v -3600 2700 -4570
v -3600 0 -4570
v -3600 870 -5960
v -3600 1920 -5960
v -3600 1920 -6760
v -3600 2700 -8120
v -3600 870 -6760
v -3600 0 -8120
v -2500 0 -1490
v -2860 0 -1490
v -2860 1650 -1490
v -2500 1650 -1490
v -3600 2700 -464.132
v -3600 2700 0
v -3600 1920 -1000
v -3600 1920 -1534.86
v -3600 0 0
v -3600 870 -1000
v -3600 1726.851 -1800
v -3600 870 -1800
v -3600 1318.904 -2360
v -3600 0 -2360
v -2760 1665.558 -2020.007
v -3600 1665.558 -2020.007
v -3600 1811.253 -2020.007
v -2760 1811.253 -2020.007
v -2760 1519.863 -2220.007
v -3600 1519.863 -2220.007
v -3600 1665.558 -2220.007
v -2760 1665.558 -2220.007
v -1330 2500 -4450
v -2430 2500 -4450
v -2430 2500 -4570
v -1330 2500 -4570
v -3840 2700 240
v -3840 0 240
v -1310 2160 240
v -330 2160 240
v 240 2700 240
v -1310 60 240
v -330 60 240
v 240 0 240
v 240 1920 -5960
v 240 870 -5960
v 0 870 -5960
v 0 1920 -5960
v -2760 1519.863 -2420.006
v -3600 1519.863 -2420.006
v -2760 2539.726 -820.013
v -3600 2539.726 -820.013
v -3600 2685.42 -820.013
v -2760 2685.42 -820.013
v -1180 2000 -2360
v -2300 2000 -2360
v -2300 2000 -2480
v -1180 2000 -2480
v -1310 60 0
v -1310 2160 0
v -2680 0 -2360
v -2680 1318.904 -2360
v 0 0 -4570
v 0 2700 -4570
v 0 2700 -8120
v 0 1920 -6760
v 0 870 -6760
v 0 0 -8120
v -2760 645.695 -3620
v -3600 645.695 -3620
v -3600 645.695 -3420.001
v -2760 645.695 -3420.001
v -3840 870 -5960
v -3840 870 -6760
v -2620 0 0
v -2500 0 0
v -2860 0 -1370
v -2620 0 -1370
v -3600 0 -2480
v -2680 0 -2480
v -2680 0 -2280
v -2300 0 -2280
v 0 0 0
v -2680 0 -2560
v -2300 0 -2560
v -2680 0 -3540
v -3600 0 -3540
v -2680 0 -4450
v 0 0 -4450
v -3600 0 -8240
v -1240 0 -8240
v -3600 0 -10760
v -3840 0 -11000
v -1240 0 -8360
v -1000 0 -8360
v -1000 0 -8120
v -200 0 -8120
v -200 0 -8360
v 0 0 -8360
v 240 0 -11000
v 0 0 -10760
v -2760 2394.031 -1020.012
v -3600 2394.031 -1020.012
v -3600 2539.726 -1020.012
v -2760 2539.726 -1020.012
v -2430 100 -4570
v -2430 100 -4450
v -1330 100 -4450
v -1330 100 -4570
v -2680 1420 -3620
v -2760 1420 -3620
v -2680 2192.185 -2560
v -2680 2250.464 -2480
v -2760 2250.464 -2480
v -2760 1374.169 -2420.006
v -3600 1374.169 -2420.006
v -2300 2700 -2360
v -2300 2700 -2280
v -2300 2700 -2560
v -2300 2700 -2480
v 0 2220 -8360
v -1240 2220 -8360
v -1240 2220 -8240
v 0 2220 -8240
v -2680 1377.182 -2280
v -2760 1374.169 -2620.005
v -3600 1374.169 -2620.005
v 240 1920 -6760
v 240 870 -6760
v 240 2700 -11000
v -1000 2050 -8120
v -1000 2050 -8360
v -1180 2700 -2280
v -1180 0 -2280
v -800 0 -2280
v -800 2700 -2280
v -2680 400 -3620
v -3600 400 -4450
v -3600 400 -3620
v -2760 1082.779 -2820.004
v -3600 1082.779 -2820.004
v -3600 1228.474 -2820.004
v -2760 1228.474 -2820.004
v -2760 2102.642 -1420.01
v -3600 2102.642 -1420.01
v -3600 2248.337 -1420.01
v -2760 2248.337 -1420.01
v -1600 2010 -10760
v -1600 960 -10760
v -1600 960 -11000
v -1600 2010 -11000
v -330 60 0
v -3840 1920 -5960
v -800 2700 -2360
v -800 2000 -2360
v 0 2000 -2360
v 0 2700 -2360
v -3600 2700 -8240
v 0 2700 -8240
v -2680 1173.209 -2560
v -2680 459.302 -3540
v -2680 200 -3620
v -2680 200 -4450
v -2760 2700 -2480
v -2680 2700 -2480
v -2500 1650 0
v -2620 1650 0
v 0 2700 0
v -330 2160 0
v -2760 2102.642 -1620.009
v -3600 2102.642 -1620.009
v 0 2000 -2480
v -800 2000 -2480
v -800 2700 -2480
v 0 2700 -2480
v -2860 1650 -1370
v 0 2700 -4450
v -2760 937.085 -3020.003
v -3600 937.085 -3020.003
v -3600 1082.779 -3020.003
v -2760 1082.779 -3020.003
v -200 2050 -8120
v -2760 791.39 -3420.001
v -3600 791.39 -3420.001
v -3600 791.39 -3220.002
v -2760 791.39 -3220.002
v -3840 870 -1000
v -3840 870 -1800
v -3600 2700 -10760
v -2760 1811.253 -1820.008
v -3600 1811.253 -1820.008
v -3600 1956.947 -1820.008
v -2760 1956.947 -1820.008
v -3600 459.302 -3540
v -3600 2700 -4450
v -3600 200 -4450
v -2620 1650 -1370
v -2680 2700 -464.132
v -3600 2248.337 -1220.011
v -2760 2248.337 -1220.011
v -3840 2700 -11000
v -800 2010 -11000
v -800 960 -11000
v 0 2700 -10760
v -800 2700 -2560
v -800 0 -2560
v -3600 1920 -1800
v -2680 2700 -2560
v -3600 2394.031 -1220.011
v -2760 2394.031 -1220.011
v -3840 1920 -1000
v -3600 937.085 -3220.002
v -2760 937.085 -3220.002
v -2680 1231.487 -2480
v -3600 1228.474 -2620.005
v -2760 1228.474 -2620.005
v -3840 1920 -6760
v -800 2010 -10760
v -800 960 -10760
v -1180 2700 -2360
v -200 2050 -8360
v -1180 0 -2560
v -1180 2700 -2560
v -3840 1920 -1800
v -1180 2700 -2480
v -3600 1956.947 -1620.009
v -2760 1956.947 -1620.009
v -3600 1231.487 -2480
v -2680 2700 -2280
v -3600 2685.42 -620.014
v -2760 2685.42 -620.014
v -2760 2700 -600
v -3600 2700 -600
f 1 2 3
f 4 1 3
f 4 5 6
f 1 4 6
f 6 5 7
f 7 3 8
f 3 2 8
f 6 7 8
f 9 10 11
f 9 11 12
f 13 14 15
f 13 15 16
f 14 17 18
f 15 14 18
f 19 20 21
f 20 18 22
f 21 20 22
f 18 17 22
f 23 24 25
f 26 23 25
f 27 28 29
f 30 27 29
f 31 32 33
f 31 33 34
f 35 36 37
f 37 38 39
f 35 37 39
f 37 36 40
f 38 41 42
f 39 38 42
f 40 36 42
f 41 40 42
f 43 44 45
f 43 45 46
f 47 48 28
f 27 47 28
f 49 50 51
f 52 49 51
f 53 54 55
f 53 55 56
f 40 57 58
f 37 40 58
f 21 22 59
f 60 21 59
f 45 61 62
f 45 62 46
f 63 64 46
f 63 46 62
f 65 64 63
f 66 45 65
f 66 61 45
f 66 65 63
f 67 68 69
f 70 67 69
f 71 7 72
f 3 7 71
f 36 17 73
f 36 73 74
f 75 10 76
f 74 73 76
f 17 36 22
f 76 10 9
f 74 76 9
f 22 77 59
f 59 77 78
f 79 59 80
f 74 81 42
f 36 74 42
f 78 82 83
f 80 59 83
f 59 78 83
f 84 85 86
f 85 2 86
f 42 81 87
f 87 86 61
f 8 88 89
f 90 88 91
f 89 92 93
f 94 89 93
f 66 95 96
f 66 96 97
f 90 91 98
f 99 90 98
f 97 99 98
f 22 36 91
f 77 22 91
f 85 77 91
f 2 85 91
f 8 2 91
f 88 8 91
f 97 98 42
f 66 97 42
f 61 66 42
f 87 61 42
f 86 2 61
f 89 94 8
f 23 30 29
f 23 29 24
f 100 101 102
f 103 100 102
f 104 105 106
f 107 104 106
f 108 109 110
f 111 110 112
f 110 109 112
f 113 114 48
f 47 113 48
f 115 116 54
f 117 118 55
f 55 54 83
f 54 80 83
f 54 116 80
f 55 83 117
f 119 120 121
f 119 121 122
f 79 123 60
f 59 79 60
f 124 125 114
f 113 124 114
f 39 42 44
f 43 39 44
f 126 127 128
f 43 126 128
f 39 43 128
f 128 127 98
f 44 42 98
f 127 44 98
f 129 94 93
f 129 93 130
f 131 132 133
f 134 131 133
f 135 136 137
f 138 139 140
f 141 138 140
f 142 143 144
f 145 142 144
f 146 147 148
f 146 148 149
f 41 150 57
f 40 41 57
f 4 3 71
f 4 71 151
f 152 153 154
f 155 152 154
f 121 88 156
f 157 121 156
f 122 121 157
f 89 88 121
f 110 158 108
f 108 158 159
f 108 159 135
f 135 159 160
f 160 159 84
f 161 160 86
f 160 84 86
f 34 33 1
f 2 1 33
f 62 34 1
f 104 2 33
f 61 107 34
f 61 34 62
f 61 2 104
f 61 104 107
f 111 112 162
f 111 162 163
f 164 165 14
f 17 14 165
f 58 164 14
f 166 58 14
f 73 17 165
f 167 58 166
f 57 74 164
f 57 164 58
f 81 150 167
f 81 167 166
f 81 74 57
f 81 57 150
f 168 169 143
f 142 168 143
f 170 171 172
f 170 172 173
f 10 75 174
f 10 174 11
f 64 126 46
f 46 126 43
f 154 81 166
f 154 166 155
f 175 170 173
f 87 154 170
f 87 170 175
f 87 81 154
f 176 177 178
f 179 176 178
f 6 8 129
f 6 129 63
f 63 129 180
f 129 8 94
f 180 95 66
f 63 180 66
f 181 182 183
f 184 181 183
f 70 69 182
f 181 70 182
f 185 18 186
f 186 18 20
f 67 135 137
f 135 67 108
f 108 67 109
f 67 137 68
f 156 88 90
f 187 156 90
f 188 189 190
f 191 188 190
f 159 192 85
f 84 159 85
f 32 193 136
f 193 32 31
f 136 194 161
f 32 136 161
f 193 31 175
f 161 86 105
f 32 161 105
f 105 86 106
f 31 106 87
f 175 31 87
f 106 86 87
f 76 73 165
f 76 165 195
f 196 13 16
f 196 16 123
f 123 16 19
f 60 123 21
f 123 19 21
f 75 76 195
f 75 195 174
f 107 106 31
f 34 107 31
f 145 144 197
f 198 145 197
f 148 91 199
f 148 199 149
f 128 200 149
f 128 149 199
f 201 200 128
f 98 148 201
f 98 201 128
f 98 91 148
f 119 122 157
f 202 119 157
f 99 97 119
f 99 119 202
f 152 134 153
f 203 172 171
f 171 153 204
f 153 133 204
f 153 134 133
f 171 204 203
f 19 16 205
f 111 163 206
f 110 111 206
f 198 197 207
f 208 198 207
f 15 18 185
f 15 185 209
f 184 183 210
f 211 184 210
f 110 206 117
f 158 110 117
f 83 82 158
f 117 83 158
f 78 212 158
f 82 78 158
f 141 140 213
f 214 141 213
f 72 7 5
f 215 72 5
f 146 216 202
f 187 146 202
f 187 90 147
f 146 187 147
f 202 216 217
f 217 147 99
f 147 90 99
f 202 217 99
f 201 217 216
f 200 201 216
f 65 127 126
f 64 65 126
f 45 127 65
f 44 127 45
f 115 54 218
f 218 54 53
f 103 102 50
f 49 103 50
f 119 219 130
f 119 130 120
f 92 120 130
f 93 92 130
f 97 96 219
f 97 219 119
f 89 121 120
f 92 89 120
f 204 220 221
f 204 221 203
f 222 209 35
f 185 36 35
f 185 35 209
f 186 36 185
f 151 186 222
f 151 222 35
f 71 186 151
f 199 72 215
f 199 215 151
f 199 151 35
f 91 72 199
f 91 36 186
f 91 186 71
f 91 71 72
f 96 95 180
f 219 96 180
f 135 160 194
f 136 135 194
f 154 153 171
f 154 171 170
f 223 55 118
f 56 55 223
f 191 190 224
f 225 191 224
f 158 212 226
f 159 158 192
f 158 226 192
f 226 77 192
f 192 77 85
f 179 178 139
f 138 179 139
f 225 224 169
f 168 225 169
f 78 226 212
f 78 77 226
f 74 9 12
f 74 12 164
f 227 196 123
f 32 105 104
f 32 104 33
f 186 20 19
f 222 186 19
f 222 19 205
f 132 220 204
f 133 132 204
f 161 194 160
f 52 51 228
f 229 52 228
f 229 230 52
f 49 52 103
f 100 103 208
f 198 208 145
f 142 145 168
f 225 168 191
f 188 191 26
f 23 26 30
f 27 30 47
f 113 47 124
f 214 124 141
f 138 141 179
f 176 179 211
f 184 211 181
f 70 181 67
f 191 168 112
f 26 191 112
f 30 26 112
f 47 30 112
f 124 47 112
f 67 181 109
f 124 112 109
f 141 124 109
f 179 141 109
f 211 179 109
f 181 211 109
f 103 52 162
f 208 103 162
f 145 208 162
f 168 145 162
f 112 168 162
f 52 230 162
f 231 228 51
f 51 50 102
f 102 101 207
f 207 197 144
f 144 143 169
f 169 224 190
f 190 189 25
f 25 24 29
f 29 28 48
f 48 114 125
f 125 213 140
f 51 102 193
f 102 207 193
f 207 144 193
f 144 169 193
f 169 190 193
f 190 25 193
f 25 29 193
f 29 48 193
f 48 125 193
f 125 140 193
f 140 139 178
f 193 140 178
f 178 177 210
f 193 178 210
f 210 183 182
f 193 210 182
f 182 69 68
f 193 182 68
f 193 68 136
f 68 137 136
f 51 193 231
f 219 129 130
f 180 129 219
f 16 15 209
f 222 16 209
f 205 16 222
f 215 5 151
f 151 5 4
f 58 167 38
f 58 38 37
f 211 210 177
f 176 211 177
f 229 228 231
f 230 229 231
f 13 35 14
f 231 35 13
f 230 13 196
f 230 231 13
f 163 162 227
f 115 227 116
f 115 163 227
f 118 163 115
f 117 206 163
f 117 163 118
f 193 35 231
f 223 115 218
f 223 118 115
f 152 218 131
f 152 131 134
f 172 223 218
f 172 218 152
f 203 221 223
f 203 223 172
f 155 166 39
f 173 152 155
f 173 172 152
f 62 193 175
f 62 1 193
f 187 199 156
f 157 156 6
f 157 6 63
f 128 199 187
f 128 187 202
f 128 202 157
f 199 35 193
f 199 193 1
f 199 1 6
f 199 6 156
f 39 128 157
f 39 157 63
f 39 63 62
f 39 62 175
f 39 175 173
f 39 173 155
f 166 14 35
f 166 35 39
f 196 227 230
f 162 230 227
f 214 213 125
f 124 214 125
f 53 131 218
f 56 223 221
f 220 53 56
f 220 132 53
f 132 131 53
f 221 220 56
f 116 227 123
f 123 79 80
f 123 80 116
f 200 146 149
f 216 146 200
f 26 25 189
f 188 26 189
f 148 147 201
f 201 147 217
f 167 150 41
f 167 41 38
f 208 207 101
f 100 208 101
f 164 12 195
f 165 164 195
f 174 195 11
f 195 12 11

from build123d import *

# Parameters (mm, degrees)
SKETCH_1_W                = 4080
SKETCH_1_H                = 11240
SKETCH_1_W_2              = 3600
SKETCH_1_H_2              = 10760
EXTRUDE_512_DEPTH         = 2700
SKETCH_6_W                = 3600
SKETCH_6_H                = 120
EXTRUDE_823_DEPTH         = 2700
SKETCH_12_W               = 1240
SKETCH_12_H               = 120
EXTRUDE_1044_DEPTH        = 2220
CUT_EXTRUDE_1283_REACH    = 2882
SKETCH_10_W               = 800
SKETCH_10_H               = 2050
SKETCH_7_W                = 3600
SKETCH_7_H                = 120
EXTRUDE_1405_DEPTH        = 2700
CUT_EXTRUDE_1668_REACH    = 6552
SKETCH_13_W               = 1100
SKETCH_13_H               = 2400
SKETCH_8_W                = 3600
SKETCH_8_H                = 120
EXTRUDE_1790_DEPTH        = 2700
EXTRUDE_2112_DEPTH        = 840
EXTRUDE_2407_DEPTH        = 80
CUT_EXTRUDE_2805_REACH    = 2702
SKETCH_19_W               = 840
SKETCH_19_H               = 120
EXTRUDE_2943_DEPTH        = 1650
EXTRUDE_3217_DEPTH        = 840
PATTERN_LINEAR_3276_COUNT = 15
PATTERN_LINEAR_3276_PITCH = 247.44
SKETCH_22_W               = 920
SKETCH_22_H               = 830
EXTRUDE_7_DEPTH           = 200
EXTRUDE_8_DEPTH           = 200
SKETCH_14_W               = 380
SKETCH_14_H               = 280
EXTRUDE_3881_DEPTH        = 2700
CUT_EXTRUDE_4195_REACH    = 8642
SKETCH_15_W               = 800
SKETCH_15_H               = 2000
SKETCH_15_W_2             = 1120
SKETCH_2_W                = 980
SKETCH_2_H                = 2100
CUT_EXTRUDE_4473_DEPTH    = 241
SKETCH_4_W                = 800
SKETCH_4_H                = 1050
CUT_EXTRUDE_4728_DEPTH    = 241
SKETCH_3_W                = 800
SKETCH_3_H                = 1050
CUT_EXTRUDE_5092_DEPTH    = 4080
CUT_EXTRUDE_5326_REACH    = 242
SKETCH_16_W               = 800
SKETCH_16_H               = 1050


with BuildPart() as part:
    # 草图1 → Extrude 512 (new body)
    with BuildSketch(Plane(origin=(0, 0, 0), x_dir=(1, 0, 0), z_dir=(0, 1, 0))):
        with Locations((-1800, 5380)):
            Rectangle(SKETCH_1_W, SKETCH_1_H)
        with Locations((-1800, 5380)):
            Rectangle(SKETCH_1_W_2, SKETCH_1_H_2, mode=Mode.SUBTRACT)
    extrude(amount=EXTRUDE_512_DEPTH)

    # 草图6 → Extrude 823 (add)
    with BuildSketch(Plane(origin=(0, 0, 0), x_dir=(1, 0, 0), z_dir=(0, 1, 0))):
        with Locations((-1800, 8180)):
            Rectangle(SKETCH_6_W, SKETCH_6_H)
    extrude(amount=EXTRUDE_823_DEPTH)

    # 草图12 → Extrude 1044 (add)
    with BuildSketch(Plane(origin=(0, 0, 0), x_dir=(1, 0, 0), z_dir=(0, 1, 0))):
        with Locations((-620, 8300)):
            Rectangle(SKETCH_12_W, SKETCH_12_H)
    extrude(amount=EXTRUDE_1044_DEPTH)

    # 草图10 → Cut-Extrude 1283 (cut, up to next)
    with BuildSketch(Plane.XY.offset(-8120), mode=Mode.PRIVATE) as cut_extrude_1283_sk1:
        with Locations((-600, 1025)):
            Rectangle(SKETCH_10_W, SKETCH_10_H)
    cut_extrude_1283_tool1 = extrude(cut_extrude_1283_sk1.sketch, amount=-CUT_EXTRUDE_1283_REACH, mode=Mode.PRIVATE) & part.part
    add(cut_extrude_1283_tool1.solids().sort_by_distance((-600, 1025, -8120))[0], mode=Mode.SUBTRACT)

    # 草图7 → Extrude 1405 (add)
    with BuildSketch(Plane(origin=(0, 0, 0), x_dir=(1, 0, 0), z_dir=(0, 1, 0))):
        with Locations((-1800, 4510)):
            Rectangle(SKETCH_7_W, SKETCH_7_H)
    extrude(amount=EXTRUDE_1405_DEPTH)

    # 草图13 → Cut-Extrude 1668 (cut, up to next)
    with BuildSketch(Plane.XY.offset(-4450), mode=Mode.PRIVATE) as cut_extrude_1668_sk1:
        with Locations((-1880, 1300)):
            Rectangle(SKETCH_13_W, SKETCH_13_H)
    cut_extrude_1668_tool1 = extrude(cut_extrude_1668_sk1.sketch, amount=-CUT_EXTRUDE_1668_REACH, mode=Mode.PRIVATE) & part.part
    add(cut_extrude_1668_tool1.solids().sort_by_distance((-1880, 1300, -4450))[0], mode=Mode.SUBTRACT)

    # 草图8 → Extrude 1790 (add)
    with BuildSketch(Plane(origin=(0, 0, 0), x_dir=(1, 0, 0), z_dir=(0, 1, 0))):
        with Locations((-1800, 2420)):
            Rectangle(SKETCH_8_W, SKETCH_8_H)
    extrude(amount=EXTRUDE_1790_DEPTH)

    # 草图17 → Extrude 2112 (add)
    with BuildSketch(Plane(origin=(-3600, 0, 0), x_dir=(0, 0, -1), z_dir=(1, 0, 0))):
        Polygon((464.132296, 2700), (3540, 459.301672), (3540, 0), (3620, 0), (3620, 500), (600, 2700), align=None)
    extrude(amount=EXTRUDE_2112_DEPTH)

    # 草图18 → Extrude 2407 (add)
    with BuildSketch(Plane(origin=(-2760, 0, 0), x_dir=(0, 0, -1), z_dir=(1, 0, 0))):
        Polygon((464.132296, 2700), (3540, 459.301672), (3540, 0), (3620, 0), (3620, 1420), (2480, 2250.463576), (2480, 2700), align=None)
    extrude(amount=EXTRUDE_2407_DEPTH)

    # Cut-Extrude 2805: up to this face of the body (flat: up to its plane)
    cut_extrude_2805_end = Plane(part.part.faces().sort_by_distance((-3180, 2058.940397, -1480))[0])
    # 草图19 → Cut-Extrude 2805 (cut, up to the picked face)
    with BuildSketch(Plane(origin=(0, 2700, 0), x_dir=(1, 0, 0), z_dir=(0, 1, 0)), mode=Mode.PRIVATE) as cut_extrude_2805_sk1:
        with Locations((-3180, 2420)):
            Rectangle(SKETCH_19_W, SKETCH_19_H)
    cut_extrude_2805_tool1 = split(extrude(cut_extrude_2805_sk1.sketch, amount=-CUT_EXTRUDE_2805_REACH, mode=Mode.PRIVATE), bisect_by=cut_extrude_2805_end, keep=Keep.BOTH, mode=Mode.PRIVATE)
    add(cut_extrude_2805_tool1.solids().sort_by_distance((-3180, 2700, -2420))[0], mode=Mode.SUBTRACT)

    # 草图20 → Extrude 2943 (add)
    with BuildSketch(Plane(origin=(0, 0, 0), x_dir=(1, 0, 0), z_dir=(0, 1, 0))):
        Polygon((-2860, 1490), (-2500, 1490), (-2500, 0), (-2620, 0), (-2620, 1370), (-2860, 1370), align=None)
    extrude(amount=EXTRUDE_2943_DEPTH)

    # 草图21 → Extrude 3217 (add)
    with BuildSketch(Plane(origin=(-3600, 0, 0), x_dir=(0, 0, -1), z_dir=(1, 0, 0))):
        Polygon((3620, 500), (3620, 645.695364), (3420, 645.695364), align=None)
    extrude_3217 = extrude(amount=EXTRUDE_3217_DEPTH)

    # Pattern Linear 3276: Extrude 3217 ×15
    with Locations(*[Vector(0, 0.588808, 0.808273) * (i * PATTERN_LINEAR_3276_PITCH) for i in range(1, PATTERN_LINEAR_3276_COUNT)]):
        add(extrude_3217)

    # 草图22 → 凸台-拉伸7 (add)
    with BuildSketch(Plane(origin=(0, 0, 0), x_dir=(1, 0, 0), z_dir=(0, 1, 0))):
        with Locations((-3140, 4035)):
            Rectangle(SKETCH_22_W, SKETCH_22_H)
    extrude(amount=EXTRUDE_7_DEPTH)

    # 草图23 → 凸台-拉伸8 (add)
    with BuildSketch(Plane(origin=(0, 200, 0), x_dir=(1, 0, 0), z_dir=(0, 1, 0))):
        Polygon((-3600, 4450), (-3600, 3620), (-2680, 3620), align=None)
    extrude(amount=EXTRUDE_8_DEPTH)

    # 草图14 → Extrude 3881 (add)
    with BuildSketch(Plane(origin=(0, 0, 0), x_dir=(1, 0, 0), z_dir=(0, 1, 0))):
        with Locations((-990, 2420)):
            Rectangle(SKETCH_14_W, SKETCH_14_H)
        with Locations((-2490, 2420)):
            Rectangle(SKETCH_14_W, SKETCH_14_H)
    extrude(amount=EXTRUDE_3881_DEPTH)

    # 草图15 → Cut-Extrude 4195 (cut, up to next)
    with BuildSketch(Plane.XY.offset(-2360), mode=Mode.PRIVATE) as cut_extrude_4195_sk1:
        with Locations((-400, 1000)):
            Rectangle(SKETCH_15_W, SKETCH_15_H)
    cut_extrude_4195_tool1 = extrude(cut_extrude_4195_sk1.sketch, amount=-CUT_EXTRUDE_4195_REACH, mode=Mode.PRIVATE) & part.part
    add(cut_extrude_4195_tool1.solids().sort_by_distance((-400, 1000, -2360))[0], mode=Mode.SUBTRACT)
    # 草图15 → Cut-Extrude 4195 (cut, up to next)
    with BuildSketch(Plane.XY.offset(-2360), mode=Mode.PRIVATE) as cut_extrude_4195_sk2:
        with Locations((-1740, 1000)):
            Rectangle(SKETCH_15_W_2, SKETCH_15_H)
    cut_extrude_4195_tool2 = extrude(cut_extrude_4195_sk2.sketch, amount=-CUT_EXTRUDE_4195_REACH, mode=Mode.PRIVATE) & part.part
    add(cut_extrude_4195_tool2.solids().sort_by_distance((-1740, 1000, -2360))[0], mode=Mode.SUBTRACT)

    # 草图2 → Cut-Extrude 4473 (cut, through all)
    with BuildSketch(Plane(origin=(0, 0, 0), x_dir=(-1, 0, 0), z_dir=(0, 0, -1))):
        with Locations((820, 1110)):
            Rectangle(SKETCH_2_W, SKETCH_2_H)
    extrude(amount=-CUT_EXTRUDE_4473_DEPTH, mode=Mode.SUBTRACT)

    # 草图4 → Cut-Extrude 4728 (cut, through all)
    with BuildSketch(Plane.XY.offset(-10760)):
        with Locations((-1200, 1485)):
            Rectangle(SKETCH_4_W, SKETCH_4_H)
    extrude(amount=-CUT_EXTRUDE_4728_DEPTH, mode=Mode.SUBTRACT)

    # 草图3 → Cut-Extrude 5092 (cut)
    with BuildSketch(Plane.ZY.offset(-240)):
        with Locations((-6360, 1395)):
            Rectangle(SKETCH_3_W, SKETCH_3_H)
    extrude(amount=CUT_EXTRUDE_5092_DEPTH, mode=Mode.SUBTRACT)

    # 草图16 → Cut-Extrude 5326 (cut, up to next)
    with BuildSketch(Plane(origin=(-3600, 0, 0), x_dir=(0, 0, -1), z_dir=(1, 0, 0)), mode=Mode.PRIVATE) as cut_extrude_5326_sk1:
        with Locations((1400, 1395)):
            Rectangle(SKETCH_16_W, SKETCH_16_H)
    cut_extrude_5326_tool1 = extrude(cut_extrude_5326_sk1.sketch, amount=-CUT_EXTRUDE_5326_REACH, mode=Mode.PRIVATE) & part.part
    add(cut_extrude_5326_tool1.solids().sort_by_distance((-3600, 1395, -1400))[0], mode=Mode.SUBTRACT)


solid = part.part
